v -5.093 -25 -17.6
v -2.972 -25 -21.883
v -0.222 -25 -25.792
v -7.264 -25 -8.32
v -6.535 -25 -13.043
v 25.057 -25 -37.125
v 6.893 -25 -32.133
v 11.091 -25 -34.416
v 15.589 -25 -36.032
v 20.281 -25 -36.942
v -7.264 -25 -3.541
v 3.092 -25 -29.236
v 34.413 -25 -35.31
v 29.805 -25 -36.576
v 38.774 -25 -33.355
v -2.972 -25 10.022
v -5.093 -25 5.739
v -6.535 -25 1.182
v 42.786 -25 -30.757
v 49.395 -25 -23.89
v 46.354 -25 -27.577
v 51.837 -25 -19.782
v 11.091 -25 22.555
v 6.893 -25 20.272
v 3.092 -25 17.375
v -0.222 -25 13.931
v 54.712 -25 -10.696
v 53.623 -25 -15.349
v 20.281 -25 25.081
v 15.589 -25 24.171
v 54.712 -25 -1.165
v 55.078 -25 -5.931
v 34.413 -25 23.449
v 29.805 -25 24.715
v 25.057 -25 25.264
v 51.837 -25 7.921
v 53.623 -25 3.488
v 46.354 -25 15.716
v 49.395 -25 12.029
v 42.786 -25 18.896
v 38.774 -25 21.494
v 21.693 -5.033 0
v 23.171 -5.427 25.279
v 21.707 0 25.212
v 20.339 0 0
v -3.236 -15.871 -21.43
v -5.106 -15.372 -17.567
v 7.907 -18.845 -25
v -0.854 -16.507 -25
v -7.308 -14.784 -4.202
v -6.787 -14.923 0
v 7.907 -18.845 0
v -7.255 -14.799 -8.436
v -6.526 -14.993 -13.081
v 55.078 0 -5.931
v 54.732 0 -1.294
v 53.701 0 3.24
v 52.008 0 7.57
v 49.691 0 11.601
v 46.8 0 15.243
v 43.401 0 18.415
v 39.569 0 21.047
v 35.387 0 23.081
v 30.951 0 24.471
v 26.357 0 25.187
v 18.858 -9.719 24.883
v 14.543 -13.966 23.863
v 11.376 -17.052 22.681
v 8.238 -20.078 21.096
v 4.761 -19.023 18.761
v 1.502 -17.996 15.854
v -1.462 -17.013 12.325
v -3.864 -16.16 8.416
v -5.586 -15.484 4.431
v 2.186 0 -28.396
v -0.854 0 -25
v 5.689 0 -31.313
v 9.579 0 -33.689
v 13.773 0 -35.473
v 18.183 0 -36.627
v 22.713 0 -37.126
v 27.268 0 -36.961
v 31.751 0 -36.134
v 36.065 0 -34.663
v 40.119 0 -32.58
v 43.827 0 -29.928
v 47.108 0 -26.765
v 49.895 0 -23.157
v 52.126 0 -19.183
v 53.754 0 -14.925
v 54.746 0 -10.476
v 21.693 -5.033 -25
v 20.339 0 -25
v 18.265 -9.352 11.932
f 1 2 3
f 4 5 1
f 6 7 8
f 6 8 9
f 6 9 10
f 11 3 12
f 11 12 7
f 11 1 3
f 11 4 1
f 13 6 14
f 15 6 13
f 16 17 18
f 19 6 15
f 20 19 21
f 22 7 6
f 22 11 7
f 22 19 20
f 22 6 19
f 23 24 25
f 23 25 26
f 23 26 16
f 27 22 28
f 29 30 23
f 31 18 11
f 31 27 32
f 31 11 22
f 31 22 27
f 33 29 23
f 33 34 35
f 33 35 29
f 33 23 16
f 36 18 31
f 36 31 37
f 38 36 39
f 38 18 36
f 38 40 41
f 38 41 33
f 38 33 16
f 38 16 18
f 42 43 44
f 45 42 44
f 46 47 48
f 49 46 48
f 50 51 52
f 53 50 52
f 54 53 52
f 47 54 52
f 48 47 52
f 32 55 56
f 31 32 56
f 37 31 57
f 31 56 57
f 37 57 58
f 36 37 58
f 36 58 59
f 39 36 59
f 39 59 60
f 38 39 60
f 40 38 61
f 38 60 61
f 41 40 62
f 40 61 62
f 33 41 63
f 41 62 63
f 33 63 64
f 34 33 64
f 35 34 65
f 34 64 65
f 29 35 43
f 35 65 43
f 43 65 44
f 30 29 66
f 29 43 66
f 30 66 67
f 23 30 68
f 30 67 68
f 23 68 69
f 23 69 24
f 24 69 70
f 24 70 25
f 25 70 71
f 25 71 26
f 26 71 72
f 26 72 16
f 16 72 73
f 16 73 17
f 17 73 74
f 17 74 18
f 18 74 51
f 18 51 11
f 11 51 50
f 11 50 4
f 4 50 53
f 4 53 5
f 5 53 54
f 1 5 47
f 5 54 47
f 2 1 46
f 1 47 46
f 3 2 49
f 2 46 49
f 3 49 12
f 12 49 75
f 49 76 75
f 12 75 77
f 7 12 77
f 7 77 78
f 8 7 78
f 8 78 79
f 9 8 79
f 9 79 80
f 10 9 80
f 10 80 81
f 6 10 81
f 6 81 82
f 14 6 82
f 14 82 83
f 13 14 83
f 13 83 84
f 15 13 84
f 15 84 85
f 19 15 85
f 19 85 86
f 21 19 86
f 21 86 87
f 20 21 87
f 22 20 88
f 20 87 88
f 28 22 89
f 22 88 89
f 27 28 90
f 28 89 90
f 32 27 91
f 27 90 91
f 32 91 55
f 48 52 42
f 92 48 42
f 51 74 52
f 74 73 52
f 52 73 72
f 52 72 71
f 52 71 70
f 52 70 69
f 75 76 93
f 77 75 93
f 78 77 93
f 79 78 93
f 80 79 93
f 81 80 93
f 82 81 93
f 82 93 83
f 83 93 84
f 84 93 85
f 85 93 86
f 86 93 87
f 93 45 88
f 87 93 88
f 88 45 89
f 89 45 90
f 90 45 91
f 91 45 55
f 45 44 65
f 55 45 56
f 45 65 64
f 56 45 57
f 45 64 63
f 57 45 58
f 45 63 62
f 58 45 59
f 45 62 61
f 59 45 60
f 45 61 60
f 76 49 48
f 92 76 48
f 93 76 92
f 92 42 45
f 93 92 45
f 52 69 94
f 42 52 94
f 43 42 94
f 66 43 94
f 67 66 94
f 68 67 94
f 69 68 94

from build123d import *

# Parameters (mm, degrees)
F0_R          = 31.2169949435
F1_DEPTH      = 25
F3_DEPTH      = 44
F3_TAPER      = -3
F3_DEPTH_BACK = 25


with BuildPart() as f1:
    # F0 (on Front) → F1 (new body)
    with BuildSketch(Plane.XZ):
        with Locations((23.8612815738, -5.9305061586)):
            Circle(F0_R)
    extrude(amount=F1_DEPTH)


with BuildPart() as f3:
    # F2 (on Top) → F3 (new body, two sides)
    with BuildSketch(Plane.XY) as f3_sk:
        Polygon((21.6927394478, -5.0327842001), (16.6236866582, 13.8126411778), (-2.2314568589, 18.8454253778), (-16.0175475864, 5.0327842001), (-10.9484947969, -13.8126411778), (7.9066487202, -18.8454253778), align=None)
    extrude(amount=F3_DEPTH, taper=F3_TAPER)
    extrude(f3_sk.sketch, amount=-F3_DEPTH_BACK)


with BuildPart() as f1_1:
    add(f1.part)

    # F4: cut F3
    add(f3.part, mode=Mode.SUBTRACT)


solid = f1_1.part
